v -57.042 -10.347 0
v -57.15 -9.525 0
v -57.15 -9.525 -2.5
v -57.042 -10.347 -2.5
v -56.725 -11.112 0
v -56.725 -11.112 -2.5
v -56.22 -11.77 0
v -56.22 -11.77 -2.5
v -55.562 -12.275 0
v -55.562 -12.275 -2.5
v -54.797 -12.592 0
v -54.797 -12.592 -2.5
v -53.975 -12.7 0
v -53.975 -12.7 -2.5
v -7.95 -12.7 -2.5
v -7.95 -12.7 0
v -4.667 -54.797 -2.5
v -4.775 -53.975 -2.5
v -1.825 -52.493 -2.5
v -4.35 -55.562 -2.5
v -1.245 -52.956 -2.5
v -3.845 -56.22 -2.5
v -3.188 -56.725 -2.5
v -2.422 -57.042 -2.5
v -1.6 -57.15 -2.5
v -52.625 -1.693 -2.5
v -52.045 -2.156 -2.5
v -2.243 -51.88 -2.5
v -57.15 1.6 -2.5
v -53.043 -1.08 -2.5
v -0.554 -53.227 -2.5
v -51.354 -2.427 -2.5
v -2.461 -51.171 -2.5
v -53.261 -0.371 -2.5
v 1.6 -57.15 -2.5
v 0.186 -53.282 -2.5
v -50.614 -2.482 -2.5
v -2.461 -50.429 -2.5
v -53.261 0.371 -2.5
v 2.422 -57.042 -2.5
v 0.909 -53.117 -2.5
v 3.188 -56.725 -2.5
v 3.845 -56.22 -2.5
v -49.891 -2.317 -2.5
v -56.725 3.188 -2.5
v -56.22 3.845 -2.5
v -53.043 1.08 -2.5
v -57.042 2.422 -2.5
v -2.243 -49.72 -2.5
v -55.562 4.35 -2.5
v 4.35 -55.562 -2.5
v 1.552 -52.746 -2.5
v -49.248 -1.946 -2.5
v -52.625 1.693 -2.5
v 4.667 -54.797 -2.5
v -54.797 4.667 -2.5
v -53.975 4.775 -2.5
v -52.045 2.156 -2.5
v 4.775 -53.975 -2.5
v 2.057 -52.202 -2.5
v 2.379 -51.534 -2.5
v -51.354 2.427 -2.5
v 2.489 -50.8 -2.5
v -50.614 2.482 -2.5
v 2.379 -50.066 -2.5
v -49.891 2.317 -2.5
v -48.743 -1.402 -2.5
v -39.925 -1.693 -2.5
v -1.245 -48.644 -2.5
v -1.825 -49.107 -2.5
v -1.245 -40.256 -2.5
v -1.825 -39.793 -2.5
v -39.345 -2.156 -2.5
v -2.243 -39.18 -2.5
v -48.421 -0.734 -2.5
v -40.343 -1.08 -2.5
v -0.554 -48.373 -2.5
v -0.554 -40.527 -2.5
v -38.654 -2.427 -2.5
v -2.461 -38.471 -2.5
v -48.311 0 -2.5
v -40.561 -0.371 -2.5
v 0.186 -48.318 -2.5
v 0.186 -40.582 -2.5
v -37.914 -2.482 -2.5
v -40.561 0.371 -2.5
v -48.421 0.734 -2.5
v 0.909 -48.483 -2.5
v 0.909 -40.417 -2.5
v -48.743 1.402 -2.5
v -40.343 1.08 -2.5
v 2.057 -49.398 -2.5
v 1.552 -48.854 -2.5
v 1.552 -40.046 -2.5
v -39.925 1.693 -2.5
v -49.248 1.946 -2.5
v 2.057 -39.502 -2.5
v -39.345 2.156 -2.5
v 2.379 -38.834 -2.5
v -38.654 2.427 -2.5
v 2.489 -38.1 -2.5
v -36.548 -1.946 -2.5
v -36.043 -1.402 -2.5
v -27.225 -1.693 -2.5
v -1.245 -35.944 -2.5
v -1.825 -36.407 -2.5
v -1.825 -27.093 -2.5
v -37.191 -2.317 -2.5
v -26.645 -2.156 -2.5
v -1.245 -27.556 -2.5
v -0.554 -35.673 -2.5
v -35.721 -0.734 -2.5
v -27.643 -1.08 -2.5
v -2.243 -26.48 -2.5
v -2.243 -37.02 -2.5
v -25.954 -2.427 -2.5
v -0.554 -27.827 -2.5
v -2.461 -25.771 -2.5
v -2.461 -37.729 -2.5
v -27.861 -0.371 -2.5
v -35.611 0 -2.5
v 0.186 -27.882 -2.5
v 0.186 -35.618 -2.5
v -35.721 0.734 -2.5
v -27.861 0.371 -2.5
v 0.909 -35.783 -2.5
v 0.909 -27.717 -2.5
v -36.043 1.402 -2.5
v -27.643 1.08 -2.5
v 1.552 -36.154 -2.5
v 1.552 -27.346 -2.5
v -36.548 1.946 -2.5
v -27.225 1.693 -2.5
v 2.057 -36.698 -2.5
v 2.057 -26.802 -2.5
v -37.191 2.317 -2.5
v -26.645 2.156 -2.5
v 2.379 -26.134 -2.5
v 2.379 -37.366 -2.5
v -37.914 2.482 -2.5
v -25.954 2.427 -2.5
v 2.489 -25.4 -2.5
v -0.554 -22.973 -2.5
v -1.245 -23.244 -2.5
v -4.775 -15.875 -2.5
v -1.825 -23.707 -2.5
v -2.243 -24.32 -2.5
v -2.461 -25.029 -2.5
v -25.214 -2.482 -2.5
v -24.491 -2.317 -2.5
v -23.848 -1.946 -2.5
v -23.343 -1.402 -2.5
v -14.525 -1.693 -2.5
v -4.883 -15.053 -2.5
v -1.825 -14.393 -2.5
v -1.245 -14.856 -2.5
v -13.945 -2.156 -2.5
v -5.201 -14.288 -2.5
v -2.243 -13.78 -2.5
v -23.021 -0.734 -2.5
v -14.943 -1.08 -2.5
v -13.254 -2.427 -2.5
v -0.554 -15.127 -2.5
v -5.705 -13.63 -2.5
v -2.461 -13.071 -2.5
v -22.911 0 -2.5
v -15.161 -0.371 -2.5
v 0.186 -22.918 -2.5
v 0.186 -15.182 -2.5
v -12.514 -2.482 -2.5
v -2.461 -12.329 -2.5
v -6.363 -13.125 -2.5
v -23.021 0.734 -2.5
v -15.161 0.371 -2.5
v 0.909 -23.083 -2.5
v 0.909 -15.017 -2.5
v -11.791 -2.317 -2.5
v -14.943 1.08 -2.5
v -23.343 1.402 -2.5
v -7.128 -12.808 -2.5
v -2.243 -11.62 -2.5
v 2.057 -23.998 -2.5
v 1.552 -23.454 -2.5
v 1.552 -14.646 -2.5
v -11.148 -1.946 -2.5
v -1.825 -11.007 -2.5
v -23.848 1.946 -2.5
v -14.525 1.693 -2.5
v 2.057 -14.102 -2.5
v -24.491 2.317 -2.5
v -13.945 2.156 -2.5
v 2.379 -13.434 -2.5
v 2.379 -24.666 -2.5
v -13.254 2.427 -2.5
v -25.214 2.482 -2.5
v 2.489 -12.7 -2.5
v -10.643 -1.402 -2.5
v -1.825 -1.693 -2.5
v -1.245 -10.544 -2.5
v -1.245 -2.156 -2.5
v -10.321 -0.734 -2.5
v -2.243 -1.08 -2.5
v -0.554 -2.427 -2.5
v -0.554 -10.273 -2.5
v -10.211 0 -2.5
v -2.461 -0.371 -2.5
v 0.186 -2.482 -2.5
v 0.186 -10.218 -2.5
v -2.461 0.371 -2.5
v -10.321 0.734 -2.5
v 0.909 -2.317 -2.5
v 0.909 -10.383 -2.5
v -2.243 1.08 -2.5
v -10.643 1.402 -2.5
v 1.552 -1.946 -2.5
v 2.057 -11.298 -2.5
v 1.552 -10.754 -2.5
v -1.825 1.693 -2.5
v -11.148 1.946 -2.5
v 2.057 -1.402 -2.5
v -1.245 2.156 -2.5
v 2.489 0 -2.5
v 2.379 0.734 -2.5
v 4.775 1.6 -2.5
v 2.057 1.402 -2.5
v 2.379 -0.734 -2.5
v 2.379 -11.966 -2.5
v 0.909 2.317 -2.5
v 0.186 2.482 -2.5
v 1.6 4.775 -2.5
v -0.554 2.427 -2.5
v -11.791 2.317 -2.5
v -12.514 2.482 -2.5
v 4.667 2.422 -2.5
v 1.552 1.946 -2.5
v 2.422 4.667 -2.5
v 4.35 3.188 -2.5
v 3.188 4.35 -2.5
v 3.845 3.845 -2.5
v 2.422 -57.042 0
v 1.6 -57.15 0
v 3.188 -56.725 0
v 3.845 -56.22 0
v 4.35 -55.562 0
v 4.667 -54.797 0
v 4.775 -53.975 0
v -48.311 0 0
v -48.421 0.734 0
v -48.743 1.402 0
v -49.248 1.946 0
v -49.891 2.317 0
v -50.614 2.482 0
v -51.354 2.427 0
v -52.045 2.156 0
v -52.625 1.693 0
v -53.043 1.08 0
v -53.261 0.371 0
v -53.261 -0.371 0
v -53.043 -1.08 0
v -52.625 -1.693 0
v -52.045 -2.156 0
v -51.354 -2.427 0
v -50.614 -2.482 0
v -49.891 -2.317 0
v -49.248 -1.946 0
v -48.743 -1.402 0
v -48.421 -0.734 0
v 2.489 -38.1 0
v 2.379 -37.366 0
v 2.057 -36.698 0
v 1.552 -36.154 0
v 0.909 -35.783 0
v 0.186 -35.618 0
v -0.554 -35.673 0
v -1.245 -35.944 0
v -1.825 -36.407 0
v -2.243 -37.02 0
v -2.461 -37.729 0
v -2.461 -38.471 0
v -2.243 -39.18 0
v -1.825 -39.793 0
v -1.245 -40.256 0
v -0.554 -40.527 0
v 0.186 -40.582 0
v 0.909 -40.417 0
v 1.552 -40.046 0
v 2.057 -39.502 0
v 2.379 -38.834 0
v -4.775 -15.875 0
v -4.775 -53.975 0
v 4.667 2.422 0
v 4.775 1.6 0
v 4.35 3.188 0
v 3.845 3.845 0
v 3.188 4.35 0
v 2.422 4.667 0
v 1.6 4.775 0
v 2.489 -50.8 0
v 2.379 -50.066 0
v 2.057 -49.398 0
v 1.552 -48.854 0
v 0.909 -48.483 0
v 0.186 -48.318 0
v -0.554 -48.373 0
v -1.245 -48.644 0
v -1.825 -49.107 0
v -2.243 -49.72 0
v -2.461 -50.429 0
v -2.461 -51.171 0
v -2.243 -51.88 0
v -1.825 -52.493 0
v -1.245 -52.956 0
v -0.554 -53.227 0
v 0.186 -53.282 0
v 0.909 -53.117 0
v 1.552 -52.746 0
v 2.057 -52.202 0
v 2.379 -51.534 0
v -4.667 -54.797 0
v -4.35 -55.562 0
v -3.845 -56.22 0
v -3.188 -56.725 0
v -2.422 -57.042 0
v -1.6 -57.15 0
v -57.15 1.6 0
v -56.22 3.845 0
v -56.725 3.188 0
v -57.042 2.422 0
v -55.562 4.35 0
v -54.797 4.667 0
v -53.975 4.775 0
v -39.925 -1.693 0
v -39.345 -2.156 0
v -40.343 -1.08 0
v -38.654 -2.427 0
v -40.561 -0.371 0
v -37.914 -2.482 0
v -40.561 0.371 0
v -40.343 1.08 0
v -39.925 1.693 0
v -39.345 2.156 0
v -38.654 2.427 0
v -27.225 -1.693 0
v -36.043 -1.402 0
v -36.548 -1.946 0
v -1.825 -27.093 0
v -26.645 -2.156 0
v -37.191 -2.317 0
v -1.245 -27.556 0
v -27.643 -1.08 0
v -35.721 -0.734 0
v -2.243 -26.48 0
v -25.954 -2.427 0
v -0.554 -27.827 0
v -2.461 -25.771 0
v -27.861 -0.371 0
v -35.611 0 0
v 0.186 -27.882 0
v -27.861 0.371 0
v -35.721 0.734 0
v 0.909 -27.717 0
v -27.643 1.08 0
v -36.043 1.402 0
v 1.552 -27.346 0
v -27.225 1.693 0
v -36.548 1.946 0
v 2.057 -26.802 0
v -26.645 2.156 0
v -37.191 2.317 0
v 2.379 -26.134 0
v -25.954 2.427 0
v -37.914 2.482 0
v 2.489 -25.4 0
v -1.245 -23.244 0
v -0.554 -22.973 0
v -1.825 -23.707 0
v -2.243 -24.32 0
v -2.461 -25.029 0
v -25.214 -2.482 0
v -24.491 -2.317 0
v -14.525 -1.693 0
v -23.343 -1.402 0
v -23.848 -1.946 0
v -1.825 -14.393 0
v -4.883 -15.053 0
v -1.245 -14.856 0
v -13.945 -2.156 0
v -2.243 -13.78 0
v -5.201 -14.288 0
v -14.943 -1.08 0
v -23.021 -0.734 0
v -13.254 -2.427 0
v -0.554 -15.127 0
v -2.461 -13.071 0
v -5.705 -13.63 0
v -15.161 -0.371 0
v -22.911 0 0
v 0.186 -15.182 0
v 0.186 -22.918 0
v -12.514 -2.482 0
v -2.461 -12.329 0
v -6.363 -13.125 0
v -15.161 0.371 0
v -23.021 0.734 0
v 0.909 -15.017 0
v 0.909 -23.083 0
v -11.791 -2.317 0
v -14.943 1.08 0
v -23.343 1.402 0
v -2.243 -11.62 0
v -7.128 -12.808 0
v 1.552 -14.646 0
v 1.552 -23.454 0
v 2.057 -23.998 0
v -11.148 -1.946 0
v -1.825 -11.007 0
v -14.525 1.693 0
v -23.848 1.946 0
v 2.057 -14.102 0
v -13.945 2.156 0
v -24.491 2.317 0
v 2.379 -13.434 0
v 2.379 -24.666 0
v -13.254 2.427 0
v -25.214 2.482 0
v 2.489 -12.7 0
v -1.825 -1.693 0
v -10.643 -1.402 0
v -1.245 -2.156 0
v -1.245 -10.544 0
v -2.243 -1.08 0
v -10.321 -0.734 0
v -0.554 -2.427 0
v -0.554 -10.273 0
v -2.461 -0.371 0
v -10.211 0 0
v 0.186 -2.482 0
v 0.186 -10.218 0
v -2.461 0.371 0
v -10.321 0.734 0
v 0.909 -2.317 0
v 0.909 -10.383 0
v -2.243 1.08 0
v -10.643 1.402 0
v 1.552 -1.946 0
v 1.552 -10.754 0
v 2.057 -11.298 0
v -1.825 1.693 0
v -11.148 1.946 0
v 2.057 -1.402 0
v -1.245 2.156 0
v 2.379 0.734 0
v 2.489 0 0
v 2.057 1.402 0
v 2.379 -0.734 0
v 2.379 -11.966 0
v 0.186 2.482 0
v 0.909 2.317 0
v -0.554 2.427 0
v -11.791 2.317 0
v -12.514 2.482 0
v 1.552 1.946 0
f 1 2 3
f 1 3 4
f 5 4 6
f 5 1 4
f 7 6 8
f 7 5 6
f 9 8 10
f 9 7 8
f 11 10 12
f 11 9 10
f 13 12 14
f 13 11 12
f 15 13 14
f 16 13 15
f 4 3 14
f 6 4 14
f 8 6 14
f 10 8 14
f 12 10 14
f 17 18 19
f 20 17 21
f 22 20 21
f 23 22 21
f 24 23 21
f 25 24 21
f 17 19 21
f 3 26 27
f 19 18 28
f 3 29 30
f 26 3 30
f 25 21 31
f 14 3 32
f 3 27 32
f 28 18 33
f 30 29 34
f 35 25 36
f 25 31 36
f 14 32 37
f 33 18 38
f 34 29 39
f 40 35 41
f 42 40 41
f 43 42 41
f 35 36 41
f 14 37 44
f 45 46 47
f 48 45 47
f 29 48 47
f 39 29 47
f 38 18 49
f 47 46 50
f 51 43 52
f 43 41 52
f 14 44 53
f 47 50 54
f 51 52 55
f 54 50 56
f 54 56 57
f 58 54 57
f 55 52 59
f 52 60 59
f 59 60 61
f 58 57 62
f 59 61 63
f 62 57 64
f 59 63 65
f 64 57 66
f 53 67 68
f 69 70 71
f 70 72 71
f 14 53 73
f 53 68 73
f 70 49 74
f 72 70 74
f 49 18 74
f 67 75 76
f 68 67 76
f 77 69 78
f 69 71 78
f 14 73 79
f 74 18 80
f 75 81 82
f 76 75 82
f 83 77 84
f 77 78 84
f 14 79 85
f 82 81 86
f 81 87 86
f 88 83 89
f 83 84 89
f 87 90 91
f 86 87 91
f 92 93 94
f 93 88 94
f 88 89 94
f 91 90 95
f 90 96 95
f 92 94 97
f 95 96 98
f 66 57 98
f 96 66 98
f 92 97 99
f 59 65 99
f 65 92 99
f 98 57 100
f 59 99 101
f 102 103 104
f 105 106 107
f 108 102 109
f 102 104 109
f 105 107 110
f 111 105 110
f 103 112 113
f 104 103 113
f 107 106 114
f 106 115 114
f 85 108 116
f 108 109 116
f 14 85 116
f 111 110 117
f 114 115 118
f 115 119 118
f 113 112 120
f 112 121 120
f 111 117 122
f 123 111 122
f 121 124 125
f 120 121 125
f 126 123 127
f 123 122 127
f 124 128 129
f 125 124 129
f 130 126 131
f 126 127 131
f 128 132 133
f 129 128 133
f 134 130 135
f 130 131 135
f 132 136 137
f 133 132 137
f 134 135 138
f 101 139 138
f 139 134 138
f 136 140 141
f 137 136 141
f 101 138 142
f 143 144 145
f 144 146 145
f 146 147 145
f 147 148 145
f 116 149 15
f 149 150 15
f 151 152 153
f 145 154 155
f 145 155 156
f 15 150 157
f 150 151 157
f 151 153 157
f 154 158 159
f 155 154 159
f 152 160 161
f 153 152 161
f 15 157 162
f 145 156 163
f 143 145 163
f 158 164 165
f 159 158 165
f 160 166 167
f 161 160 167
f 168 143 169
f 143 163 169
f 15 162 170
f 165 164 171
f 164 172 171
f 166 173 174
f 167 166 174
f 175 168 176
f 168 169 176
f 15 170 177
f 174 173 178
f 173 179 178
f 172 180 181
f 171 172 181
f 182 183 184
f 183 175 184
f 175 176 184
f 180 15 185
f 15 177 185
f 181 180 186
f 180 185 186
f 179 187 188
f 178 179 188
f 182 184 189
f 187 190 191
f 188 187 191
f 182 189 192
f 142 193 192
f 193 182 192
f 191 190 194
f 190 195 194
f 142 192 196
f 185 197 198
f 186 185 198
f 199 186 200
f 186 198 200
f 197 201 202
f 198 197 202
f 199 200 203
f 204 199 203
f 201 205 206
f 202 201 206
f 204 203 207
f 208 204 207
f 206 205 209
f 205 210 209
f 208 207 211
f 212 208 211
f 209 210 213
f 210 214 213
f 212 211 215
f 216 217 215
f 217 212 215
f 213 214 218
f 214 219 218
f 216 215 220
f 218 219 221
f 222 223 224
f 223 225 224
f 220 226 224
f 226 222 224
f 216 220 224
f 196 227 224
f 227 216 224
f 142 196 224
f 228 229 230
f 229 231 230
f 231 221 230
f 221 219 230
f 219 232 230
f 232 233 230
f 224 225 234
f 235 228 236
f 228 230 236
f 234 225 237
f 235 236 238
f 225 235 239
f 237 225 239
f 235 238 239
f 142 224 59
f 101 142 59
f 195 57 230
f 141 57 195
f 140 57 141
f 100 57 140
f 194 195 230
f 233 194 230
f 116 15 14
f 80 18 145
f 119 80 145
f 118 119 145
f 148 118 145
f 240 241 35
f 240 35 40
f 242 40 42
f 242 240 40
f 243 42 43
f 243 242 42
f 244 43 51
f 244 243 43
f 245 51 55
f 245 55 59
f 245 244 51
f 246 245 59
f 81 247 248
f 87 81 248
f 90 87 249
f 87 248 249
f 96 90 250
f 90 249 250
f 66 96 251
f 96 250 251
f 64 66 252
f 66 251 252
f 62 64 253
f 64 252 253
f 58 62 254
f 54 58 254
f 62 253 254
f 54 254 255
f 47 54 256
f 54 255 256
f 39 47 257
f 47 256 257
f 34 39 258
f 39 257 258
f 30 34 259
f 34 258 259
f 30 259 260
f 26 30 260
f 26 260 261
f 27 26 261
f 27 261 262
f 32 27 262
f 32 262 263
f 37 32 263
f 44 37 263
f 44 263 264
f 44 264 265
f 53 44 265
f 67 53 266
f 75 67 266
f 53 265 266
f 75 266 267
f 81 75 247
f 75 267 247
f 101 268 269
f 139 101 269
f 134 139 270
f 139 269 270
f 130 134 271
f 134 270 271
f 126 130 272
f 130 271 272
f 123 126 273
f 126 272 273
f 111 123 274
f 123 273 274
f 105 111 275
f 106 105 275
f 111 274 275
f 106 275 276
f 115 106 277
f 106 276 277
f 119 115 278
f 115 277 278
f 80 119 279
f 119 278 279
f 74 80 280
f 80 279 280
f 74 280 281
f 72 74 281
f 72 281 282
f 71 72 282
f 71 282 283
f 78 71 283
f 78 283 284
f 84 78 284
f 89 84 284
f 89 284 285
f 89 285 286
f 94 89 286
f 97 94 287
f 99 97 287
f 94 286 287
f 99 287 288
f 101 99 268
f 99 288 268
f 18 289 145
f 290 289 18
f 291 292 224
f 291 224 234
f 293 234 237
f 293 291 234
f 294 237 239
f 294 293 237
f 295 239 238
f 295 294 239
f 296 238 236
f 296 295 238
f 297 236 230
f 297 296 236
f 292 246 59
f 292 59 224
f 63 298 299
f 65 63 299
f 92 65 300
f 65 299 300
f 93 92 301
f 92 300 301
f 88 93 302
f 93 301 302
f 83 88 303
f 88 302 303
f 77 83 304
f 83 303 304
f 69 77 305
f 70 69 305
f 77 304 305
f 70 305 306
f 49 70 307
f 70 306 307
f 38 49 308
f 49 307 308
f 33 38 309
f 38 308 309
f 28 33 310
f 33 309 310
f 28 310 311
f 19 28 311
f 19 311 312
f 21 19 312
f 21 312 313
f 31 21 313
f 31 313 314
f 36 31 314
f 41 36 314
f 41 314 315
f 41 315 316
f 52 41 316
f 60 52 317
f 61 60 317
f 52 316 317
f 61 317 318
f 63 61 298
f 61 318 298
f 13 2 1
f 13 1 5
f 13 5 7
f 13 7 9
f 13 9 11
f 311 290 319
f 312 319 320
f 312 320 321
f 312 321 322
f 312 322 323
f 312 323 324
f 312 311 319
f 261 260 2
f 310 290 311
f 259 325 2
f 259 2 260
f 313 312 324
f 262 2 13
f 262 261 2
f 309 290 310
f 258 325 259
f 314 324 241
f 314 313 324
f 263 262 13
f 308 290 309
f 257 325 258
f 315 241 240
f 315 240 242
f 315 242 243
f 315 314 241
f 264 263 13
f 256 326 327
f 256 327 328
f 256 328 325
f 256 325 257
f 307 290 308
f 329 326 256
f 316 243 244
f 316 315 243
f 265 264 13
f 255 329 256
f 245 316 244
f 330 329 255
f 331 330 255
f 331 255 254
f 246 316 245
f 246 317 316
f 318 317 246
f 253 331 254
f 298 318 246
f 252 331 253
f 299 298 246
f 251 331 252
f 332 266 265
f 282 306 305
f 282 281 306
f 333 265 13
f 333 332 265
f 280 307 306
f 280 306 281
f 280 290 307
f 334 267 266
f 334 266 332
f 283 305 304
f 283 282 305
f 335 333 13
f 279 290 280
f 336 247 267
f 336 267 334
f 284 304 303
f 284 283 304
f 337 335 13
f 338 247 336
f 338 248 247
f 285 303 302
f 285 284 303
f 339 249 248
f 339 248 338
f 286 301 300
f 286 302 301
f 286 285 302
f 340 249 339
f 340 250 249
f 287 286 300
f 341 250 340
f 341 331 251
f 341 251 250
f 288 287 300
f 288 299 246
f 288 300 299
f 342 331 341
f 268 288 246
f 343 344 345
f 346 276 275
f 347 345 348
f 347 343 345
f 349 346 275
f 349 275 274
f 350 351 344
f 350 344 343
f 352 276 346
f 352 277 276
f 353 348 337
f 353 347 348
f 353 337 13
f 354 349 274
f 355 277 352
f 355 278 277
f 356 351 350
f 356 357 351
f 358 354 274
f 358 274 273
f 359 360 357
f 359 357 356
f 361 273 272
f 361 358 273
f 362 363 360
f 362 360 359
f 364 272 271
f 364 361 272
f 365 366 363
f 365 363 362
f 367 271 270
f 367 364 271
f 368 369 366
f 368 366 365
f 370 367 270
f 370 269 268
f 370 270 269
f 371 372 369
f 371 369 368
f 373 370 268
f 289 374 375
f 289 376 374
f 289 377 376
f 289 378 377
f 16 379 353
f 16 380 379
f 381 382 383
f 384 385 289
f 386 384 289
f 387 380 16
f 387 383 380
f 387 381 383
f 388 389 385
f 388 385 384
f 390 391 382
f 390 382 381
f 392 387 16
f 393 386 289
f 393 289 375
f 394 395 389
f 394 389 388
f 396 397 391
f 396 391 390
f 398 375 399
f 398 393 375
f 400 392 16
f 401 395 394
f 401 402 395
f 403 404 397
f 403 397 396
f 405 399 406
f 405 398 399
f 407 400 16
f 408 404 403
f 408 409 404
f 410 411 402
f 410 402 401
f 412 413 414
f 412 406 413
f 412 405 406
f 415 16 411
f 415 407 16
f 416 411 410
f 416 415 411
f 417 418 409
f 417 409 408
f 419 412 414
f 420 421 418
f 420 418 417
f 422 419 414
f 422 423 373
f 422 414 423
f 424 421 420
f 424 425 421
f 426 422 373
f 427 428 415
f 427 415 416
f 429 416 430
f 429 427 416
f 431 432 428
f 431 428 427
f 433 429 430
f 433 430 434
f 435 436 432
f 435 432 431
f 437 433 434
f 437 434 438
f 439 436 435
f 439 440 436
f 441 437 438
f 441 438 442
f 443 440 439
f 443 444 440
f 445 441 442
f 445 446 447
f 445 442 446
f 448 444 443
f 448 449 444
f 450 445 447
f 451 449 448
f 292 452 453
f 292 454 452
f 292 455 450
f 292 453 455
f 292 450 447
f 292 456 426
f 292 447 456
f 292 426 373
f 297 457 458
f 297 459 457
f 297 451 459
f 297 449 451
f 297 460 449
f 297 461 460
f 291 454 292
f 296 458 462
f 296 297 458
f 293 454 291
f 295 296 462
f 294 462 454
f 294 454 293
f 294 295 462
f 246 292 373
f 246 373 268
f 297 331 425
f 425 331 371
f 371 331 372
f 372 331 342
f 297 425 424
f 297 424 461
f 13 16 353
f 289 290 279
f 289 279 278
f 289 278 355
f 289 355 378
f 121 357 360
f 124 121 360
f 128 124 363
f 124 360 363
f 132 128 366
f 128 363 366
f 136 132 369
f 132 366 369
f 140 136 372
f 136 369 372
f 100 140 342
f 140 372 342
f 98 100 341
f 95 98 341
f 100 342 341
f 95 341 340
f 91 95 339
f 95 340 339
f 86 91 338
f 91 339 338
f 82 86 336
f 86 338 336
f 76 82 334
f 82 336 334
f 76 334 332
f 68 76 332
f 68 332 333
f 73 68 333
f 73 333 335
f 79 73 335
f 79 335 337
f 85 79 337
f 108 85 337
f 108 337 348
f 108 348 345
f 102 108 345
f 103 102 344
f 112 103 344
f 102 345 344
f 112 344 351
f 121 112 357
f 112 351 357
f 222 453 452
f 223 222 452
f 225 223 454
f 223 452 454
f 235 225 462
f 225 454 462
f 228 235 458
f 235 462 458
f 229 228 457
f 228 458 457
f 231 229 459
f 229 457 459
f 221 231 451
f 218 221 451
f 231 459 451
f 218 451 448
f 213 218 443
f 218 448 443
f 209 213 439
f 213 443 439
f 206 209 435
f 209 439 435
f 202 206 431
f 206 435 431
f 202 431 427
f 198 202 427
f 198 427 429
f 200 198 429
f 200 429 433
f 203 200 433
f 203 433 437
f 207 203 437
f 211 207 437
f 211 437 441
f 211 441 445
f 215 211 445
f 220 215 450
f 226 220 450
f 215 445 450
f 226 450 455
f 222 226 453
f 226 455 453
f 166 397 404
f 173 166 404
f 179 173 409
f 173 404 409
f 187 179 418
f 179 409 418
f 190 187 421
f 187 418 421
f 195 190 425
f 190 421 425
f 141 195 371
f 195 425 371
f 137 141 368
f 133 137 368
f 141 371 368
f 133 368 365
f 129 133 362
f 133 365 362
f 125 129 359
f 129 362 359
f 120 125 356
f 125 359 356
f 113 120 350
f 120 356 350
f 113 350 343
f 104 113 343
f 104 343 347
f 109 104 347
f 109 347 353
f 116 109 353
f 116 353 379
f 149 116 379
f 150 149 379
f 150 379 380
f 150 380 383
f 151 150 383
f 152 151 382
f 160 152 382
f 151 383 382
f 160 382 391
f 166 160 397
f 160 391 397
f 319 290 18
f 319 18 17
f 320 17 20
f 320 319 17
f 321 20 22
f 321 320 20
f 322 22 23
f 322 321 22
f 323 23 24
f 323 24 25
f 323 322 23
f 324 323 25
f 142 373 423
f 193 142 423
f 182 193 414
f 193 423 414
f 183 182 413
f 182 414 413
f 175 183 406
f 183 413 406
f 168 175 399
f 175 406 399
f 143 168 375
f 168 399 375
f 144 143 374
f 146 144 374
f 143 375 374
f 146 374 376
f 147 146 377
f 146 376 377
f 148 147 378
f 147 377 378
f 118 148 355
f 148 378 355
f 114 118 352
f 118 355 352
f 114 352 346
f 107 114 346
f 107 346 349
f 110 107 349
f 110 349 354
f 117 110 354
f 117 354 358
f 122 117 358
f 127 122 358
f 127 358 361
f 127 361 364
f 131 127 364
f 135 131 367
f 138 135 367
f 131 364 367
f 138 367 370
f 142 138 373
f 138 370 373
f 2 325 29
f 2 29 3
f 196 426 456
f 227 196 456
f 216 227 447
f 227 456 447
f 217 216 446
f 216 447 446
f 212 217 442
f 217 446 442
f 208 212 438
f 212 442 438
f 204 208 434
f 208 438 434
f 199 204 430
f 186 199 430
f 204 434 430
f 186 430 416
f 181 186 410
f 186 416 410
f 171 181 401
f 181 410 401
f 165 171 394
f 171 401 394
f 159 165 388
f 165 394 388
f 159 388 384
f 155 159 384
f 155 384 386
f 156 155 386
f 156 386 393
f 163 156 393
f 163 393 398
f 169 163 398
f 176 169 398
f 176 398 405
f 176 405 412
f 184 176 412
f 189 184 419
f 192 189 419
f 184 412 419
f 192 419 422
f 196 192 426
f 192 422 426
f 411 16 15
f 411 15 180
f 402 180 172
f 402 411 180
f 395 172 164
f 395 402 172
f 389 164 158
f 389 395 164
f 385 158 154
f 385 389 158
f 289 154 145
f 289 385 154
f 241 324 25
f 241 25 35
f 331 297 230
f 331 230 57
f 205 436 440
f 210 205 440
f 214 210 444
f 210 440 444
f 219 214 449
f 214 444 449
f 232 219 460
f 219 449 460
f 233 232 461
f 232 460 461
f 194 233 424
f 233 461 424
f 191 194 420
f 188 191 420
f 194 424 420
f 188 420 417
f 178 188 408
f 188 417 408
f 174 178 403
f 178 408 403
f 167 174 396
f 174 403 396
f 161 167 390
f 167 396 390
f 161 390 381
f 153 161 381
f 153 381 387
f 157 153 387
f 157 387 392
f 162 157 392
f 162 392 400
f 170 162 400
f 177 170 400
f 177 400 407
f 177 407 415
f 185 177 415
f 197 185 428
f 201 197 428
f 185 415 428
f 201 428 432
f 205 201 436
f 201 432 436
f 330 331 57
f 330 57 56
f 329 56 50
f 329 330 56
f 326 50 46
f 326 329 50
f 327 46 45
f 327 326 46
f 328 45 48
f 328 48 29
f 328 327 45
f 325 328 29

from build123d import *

# Parameters (mm, degrees)
SKETCH1_R           = 2.4892
BOSS_EXTRUDE1_DEPTH = 2.5


with BuildPart() as part:
    # Sketch1 → Boss-Extrude1 (new body)
    with BuildSketch(Plane.XY):
        with BuildLine():
            Line((-1.6002, -57.15), (1.6002, -57.15))
            ThreePointArc((1.6002, -57.15), (3.84526403, -56.22006403), (4.7752, -53.975))
            Line((4.7752, -53.975), (4.7752, 1.6002))
            ThreePointArc((4.7752, 1.6002), (3.84526403, 3.84526403), (1.6002, 4.7752))
            Line((1.6002, 4.7752), (-53.975, 4.7752))
            ThreePointArc((-53.975, 4.7752), (-56.22006403, 3.84526403), (-57.15, 1.6002))
            Line((-57.15, 1.6002), (-57.15, -9.525))
            ThreePointArc((-57.15, -9.525), (-56.22006403, -11.77006403), (-53.975, -12.7))
            Line((-53.975, -12.7), (-7.9502, -12.7))
            ThreePointArc((-7.9502, -12.7), (-5.70513597, -13.62993597), (-4.7752, -15.875))
            Line((-4.7752, -15.875), (-4.7752, -53.975))
            ThreePointArc((-4.7752, -53.975), (-3.84526403, -56.22006403), (-1.6002, -57.15))
        make_face()
        with Locations((-12.7, 0)):
            Circle(SKETCH1_R, mode=Mode.SUBTRACT)
        Circle(SKETCH1_R, mode=Mode.SUBTRACT)
        with Locations((-25.4, 0)):
            Circle(SKETCH1_R, mode=Mode.SUBTRACT)
        with Locations((-38.1, 0)):
            Circle(SKETCH1_R, mode=Mode.SUBTRACT)
        with Locations((-50.8, 0)):
            Circle(SKETCH1_R, mode=Mode.SUBTRACT)
        with Locations((0, -12.7)):
            Circle(SKETCH1_R, mode=Mode.SUBTRACT)
        with Locations((0, -25.4)):
            Circle(SKETCH1_R, mode=Mode.SUBTRACT)
        with Locations((0, -38.1)):
            Circle(SKETCH1_R, mode=Mode.SUBTRACT)
        with Locations((0, -50.8)):
            Circle(SKETCH1_R, mode=Mode.SUBTRACT)
    extrude(amount=-BOSS_EXTRUDE1_DEPTH)


solid = part.part
